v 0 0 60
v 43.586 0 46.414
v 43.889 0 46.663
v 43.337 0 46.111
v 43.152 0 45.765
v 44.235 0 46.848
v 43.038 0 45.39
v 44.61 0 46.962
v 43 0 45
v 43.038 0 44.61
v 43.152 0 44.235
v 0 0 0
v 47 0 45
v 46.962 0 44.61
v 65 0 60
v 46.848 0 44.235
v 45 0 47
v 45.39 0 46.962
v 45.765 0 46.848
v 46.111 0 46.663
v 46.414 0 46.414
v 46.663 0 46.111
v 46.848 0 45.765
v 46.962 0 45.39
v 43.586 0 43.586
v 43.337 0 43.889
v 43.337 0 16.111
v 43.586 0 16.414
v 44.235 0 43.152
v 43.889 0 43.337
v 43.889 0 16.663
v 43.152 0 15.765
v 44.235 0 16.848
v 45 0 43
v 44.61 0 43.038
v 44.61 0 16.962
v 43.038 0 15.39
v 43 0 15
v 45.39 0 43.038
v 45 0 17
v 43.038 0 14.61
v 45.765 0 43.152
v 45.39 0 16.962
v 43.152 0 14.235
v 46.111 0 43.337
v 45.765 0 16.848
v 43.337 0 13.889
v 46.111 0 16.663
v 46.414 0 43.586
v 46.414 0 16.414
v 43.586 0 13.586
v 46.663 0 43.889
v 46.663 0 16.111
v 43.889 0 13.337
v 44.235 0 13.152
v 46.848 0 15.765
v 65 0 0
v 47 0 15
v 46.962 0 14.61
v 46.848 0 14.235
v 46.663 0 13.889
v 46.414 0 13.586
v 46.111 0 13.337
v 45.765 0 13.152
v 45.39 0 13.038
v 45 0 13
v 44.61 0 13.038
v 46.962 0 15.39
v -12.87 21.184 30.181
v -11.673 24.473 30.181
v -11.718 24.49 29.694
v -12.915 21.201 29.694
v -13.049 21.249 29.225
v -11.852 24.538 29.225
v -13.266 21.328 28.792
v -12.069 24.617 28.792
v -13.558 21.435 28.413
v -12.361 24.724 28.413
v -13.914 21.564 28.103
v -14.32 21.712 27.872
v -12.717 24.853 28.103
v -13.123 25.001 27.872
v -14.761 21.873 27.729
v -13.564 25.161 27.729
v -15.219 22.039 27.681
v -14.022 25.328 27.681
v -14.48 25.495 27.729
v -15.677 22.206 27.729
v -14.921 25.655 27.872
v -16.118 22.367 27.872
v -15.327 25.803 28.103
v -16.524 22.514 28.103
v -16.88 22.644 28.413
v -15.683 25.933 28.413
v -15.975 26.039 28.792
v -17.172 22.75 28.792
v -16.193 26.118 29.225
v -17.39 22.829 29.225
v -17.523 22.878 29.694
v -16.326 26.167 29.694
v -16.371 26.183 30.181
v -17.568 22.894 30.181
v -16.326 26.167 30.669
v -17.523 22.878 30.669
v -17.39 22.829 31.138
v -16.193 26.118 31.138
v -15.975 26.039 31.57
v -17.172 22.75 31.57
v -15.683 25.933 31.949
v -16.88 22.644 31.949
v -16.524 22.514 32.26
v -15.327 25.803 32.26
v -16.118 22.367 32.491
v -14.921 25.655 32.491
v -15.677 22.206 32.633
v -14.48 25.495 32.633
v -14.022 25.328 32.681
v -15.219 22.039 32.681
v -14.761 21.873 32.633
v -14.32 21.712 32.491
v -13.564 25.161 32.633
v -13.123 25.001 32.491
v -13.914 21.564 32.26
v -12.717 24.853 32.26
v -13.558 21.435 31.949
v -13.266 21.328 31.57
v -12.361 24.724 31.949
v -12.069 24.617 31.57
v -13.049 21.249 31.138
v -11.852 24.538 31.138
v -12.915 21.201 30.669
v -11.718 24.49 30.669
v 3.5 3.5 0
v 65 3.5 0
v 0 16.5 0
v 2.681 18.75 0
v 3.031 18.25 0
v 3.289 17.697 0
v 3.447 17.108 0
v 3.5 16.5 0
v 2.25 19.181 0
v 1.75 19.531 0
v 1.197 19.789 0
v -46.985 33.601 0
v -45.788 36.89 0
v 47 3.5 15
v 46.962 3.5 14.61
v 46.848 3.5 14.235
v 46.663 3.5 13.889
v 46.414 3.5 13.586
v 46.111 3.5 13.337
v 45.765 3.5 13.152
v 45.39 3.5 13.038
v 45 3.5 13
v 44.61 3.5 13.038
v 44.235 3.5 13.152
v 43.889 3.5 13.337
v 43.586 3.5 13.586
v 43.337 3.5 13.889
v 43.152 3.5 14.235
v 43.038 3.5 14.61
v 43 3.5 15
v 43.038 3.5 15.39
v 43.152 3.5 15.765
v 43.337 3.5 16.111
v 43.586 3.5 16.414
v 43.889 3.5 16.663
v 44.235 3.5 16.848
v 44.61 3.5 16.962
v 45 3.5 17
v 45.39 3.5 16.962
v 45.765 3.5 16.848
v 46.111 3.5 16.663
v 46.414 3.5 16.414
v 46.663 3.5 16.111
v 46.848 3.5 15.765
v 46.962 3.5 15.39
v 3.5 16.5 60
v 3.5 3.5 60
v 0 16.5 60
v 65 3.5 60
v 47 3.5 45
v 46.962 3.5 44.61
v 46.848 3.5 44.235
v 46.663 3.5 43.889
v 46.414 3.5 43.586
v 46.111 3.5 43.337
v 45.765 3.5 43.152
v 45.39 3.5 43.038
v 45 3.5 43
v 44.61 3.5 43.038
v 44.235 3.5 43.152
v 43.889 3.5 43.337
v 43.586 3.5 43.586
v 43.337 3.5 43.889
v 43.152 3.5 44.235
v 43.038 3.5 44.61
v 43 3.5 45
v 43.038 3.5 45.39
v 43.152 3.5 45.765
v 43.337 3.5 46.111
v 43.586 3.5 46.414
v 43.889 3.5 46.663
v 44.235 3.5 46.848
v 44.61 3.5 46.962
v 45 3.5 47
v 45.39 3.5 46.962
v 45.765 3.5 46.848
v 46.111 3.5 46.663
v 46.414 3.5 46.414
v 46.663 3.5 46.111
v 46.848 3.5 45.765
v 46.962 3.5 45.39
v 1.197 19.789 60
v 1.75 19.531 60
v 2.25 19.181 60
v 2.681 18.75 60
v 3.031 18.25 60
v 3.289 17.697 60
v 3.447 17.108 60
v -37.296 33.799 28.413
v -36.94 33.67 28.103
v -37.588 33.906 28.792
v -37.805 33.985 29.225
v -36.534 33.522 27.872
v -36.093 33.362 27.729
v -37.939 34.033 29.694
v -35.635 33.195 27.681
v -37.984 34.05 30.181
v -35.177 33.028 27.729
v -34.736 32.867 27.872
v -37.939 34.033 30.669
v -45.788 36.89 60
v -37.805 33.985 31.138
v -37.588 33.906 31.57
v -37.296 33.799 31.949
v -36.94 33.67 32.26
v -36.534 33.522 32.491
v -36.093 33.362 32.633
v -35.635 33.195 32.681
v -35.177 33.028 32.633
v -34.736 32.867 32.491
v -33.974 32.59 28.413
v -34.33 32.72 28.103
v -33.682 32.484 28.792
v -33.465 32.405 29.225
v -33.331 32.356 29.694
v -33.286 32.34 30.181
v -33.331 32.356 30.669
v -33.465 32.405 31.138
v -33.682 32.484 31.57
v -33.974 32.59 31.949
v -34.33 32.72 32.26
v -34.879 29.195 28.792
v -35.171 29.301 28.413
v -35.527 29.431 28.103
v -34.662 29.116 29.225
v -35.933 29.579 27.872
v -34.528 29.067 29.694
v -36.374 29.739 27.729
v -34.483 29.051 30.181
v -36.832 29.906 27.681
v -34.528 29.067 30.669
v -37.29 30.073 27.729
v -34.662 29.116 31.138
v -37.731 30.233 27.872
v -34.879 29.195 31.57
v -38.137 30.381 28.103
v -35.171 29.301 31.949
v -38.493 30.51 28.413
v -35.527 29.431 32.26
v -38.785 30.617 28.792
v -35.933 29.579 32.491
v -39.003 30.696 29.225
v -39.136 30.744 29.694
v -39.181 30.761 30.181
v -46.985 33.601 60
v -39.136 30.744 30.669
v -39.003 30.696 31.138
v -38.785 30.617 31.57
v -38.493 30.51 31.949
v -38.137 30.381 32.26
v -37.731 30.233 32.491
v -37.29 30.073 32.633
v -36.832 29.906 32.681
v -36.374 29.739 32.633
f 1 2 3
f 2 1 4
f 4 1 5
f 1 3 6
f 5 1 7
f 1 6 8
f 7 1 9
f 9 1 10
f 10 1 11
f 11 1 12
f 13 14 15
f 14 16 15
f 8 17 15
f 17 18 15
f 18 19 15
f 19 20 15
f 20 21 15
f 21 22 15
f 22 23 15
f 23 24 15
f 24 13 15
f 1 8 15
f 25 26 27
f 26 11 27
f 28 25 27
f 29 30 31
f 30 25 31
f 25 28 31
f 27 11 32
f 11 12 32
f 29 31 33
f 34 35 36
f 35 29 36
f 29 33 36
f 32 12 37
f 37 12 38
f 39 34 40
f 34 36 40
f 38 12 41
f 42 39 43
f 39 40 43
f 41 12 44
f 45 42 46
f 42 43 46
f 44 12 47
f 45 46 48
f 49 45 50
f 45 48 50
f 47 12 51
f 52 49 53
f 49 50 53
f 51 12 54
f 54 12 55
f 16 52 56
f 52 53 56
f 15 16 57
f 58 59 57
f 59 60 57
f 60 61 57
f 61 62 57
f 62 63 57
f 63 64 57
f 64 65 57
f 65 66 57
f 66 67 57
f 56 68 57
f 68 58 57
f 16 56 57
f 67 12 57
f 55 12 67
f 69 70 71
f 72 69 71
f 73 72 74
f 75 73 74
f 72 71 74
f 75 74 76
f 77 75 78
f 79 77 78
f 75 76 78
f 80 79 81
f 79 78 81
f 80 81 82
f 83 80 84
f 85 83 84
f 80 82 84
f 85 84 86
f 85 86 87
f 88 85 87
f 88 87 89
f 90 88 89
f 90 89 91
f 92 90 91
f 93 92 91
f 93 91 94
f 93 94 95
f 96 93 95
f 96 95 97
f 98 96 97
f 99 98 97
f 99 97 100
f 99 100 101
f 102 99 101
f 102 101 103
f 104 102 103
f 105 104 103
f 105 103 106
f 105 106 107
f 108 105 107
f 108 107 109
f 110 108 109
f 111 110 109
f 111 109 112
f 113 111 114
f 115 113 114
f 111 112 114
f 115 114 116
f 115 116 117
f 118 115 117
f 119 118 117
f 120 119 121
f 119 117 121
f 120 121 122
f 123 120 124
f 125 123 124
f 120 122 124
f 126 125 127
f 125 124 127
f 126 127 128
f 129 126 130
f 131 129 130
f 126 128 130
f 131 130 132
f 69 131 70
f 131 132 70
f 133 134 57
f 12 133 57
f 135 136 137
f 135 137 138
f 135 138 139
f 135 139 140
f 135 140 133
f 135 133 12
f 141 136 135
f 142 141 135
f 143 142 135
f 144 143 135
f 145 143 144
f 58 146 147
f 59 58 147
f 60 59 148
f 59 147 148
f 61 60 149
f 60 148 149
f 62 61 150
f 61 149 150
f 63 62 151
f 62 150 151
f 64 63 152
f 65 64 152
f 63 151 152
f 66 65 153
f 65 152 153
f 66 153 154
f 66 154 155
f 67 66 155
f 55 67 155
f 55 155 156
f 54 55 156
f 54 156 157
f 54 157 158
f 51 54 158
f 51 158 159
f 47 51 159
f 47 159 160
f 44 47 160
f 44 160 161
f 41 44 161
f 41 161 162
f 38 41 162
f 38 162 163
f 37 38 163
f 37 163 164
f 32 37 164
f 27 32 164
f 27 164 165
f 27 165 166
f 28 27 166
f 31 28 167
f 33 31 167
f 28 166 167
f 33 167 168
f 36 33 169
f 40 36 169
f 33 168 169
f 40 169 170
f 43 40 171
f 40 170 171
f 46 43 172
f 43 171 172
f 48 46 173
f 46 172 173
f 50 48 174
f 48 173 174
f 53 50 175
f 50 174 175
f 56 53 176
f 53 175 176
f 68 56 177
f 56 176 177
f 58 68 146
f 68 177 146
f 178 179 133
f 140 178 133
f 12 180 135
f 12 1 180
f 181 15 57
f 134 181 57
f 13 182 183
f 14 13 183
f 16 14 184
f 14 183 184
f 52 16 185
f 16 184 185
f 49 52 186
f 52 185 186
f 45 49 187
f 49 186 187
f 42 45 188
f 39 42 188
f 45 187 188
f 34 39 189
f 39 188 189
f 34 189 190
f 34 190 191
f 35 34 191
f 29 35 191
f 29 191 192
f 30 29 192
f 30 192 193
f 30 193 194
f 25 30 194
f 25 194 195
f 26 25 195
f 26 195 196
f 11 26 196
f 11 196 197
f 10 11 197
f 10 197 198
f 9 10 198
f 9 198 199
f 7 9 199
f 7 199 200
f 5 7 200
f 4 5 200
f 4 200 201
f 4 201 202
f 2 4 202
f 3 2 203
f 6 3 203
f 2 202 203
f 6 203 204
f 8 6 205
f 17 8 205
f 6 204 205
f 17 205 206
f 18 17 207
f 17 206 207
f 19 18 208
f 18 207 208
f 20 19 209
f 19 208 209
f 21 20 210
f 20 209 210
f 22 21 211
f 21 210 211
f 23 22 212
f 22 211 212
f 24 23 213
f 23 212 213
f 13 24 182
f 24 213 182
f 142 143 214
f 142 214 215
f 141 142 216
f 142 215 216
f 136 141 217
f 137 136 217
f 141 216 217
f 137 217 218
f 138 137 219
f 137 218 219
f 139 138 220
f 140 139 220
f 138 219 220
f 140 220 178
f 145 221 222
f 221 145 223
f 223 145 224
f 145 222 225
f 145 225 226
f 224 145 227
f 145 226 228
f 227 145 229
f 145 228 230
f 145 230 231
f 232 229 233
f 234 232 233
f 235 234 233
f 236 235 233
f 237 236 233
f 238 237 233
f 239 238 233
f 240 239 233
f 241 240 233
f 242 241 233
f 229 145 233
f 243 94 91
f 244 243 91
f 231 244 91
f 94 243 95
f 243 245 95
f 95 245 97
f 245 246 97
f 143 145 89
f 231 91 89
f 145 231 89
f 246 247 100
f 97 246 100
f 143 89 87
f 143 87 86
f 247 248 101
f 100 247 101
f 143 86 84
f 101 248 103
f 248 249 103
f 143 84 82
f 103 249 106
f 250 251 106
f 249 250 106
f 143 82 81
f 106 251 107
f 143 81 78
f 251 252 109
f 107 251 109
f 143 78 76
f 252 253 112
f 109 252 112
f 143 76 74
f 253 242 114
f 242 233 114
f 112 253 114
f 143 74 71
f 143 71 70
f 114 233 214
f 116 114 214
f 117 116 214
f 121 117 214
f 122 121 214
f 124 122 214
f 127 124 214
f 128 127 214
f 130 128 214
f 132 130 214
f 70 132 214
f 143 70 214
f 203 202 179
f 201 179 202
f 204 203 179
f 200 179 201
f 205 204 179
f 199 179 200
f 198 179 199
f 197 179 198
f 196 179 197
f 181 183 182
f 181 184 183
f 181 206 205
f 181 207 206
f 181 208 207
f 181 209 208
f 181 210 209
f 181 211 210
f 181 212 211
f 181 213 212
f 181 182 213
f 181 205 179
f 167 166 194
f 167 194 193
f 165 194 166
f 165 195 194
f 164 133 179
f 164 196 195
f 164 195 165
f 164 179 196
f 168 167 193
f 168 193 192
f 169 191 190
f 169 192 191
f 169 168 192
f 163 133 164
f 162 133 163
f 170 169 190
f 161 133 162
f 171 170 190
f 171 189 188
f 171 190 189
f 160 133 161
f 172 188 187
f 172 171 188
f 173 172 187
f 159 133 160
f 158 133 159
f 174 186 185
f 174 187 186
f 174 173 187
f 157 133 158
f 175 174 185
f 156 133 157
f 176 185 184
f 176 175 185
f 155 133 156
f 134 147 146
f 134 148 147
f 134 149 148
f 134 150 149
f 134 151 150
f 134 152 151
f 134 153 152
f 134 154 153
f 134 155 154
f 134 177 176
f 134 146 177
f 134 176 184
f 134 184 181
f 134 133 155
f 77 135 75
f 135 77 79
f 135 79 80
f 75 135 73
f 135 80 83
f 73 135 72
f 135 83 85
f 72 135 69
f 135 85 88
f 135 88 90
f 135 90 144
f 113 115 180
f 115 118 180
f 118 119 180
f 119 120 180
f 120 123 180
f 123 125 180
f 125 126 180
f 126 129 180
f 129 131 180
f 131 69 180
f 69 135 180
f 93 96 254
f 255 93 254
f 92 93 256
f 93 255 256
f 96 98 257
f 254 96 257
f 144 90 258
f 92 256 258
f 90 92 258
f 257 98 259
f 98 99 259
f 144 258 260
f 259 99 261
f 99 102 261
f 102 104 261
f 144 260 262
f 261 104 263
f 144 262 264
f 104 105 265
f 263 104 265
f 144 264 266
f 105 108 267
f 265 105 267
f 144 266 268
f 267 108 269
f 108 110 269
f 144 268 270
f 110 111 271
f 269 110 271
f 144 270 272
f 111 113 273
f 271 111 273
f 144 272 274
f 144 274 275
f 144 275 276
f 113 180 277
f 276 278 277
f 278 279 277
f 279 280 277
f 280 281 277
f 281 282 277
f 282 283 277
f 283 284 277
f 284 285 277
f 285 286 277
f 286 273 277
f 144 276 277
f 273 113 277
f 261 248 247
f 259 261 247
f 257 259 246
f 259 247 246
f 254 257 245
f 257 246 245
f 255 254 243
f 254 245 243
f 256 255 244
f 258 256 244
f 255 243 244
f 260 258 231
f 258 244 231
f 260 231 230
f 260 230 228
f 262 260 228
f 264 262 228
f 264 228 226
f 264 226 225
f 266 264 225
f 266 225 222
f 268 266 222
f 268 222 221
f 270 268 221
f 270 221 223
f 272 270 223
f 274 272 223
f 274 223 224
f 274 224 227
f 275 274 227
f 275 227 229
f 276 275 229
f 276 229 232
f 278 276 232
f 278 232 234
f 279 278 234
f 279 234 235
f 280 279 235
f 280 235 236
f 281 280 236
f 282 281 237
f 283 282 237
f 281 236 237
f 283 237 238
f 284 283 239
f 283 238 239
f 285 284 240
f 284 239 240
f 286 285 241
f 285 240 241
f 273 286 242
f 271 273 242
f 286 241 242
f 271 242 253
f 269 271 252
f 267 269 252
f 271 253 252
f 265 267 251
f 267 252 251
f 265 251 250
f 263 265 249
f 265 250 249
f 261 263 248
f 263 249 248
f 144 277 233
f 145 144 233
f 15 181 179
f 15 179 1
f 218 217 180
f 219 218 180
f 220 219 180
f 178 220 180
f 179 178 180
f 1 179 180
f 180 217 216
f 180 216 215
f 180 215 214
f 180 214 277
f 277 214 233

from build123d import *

# Parameters (mm, degrees)
SKETCH1_W           = 65
SKETCH1_H           = 60
BOSS_EXTRUDE1_DEPTH = 3.5
SKETCH2_W           = 3.5
SKETCH2_H           = 60
BOSS_EXTRUDE2_DEPTH = 13
BOSS_EXTRUDE5_DEPTH = 60
SKETCH9_R           = 2
CUT_EXTRUDE1_DEPTH  = 60
SKETCH10_R          = 2.5
CUT_EXTRUDE2_DEPTH  = 60


with BuildPart() as part:
    # Sketch1 → Boss-Extrude1 (new body)
    with BuildSketch(Plane(origin=(0, 0, 0), x_dir=(1, 0, 0), z_dir=(0, 1, 0))):
        with Locations((32.5, -30)):
            Rectangle(SKETCH1_W, SKETCH1_H)
    extrude(amount=BOSS_EXTRUDE1_DEPTH)

    # Sketch2 → Boss-Extrude2 (add)
    with BuildSketch(Plane(origin=(0, 3.5, 0), x_dir=(1, 0, 0), z_dir=(0, 1, 0))):
        with Locations((1.75, -30)):
            Rectangle(SKETCH2_W, SKETCH2_H)
    extrude(amount=BOSS_EXTRUDE2_DEPTH)

    # Sketch7 → Boss-Extrude5 (add)
    with BuildSketch(Plane.XY.offset(60)):
        with BuildLine():
            Line((0, 16.5), (-46.984631039, 33.601007166))
            Line((-46.984631039, 33.601007166), (-45.787560538, 36.889931339))
            Line((-45.787560538, 36.889931339), (1.197070502, 19.788924173))
            ThreePointArc((1.197070502, 19.788924173), (2.867032155, 18.507517527), (3.5, 16.5))
            Line((3.5, 16.5), (3.5, 3.5))
            Line((3.5, 3.5), (65, 3.5))
            Line((65, 3.5), (65, 0))
            Line((65, 0), (0, 0))
            Line((0, 0), (0, 16.5))
        make_face()
    extrude(amount=-BOSS_EXTRUDE5_DEPTH)

    # Sketch9 → Cut-Extrude1 (cut)
    with BuildSketch(Plane(origin=(0, 3.5, 0), x_dir=(1, 0, 0), z_dir=(0, 1, 0))):
        with Locations((45, -15)):
            Circle(SKETCH9_R)
        with Locations((45, -45)):
            Circle(SKETCH9_R)
    extrude(amount=-CUT_EXTRUDE1_DEPTH, mode=Mode.SUBTRACT)

    # Sketch10 → Cut-Extrude2 (cut)
    with BuildSketch(Plane(origin=(6.500068282, 17.858790828, 0), x_dir=(0.939692621, -0.342020143, 0), z_dir=(0.342020143, 0.939692621, 0))):
        with Locations((-44.839233595, -30.181228876)):
            Circle(SKETCH10_R)
        with Locations((-21.839233595, -30.181228876)):
            Circle(SKETCH10_R)
    extrude(amount=-CUT_EXTRUDE2_DEPTH, mode=Mode.SUBTRACT)


solid = part.part
